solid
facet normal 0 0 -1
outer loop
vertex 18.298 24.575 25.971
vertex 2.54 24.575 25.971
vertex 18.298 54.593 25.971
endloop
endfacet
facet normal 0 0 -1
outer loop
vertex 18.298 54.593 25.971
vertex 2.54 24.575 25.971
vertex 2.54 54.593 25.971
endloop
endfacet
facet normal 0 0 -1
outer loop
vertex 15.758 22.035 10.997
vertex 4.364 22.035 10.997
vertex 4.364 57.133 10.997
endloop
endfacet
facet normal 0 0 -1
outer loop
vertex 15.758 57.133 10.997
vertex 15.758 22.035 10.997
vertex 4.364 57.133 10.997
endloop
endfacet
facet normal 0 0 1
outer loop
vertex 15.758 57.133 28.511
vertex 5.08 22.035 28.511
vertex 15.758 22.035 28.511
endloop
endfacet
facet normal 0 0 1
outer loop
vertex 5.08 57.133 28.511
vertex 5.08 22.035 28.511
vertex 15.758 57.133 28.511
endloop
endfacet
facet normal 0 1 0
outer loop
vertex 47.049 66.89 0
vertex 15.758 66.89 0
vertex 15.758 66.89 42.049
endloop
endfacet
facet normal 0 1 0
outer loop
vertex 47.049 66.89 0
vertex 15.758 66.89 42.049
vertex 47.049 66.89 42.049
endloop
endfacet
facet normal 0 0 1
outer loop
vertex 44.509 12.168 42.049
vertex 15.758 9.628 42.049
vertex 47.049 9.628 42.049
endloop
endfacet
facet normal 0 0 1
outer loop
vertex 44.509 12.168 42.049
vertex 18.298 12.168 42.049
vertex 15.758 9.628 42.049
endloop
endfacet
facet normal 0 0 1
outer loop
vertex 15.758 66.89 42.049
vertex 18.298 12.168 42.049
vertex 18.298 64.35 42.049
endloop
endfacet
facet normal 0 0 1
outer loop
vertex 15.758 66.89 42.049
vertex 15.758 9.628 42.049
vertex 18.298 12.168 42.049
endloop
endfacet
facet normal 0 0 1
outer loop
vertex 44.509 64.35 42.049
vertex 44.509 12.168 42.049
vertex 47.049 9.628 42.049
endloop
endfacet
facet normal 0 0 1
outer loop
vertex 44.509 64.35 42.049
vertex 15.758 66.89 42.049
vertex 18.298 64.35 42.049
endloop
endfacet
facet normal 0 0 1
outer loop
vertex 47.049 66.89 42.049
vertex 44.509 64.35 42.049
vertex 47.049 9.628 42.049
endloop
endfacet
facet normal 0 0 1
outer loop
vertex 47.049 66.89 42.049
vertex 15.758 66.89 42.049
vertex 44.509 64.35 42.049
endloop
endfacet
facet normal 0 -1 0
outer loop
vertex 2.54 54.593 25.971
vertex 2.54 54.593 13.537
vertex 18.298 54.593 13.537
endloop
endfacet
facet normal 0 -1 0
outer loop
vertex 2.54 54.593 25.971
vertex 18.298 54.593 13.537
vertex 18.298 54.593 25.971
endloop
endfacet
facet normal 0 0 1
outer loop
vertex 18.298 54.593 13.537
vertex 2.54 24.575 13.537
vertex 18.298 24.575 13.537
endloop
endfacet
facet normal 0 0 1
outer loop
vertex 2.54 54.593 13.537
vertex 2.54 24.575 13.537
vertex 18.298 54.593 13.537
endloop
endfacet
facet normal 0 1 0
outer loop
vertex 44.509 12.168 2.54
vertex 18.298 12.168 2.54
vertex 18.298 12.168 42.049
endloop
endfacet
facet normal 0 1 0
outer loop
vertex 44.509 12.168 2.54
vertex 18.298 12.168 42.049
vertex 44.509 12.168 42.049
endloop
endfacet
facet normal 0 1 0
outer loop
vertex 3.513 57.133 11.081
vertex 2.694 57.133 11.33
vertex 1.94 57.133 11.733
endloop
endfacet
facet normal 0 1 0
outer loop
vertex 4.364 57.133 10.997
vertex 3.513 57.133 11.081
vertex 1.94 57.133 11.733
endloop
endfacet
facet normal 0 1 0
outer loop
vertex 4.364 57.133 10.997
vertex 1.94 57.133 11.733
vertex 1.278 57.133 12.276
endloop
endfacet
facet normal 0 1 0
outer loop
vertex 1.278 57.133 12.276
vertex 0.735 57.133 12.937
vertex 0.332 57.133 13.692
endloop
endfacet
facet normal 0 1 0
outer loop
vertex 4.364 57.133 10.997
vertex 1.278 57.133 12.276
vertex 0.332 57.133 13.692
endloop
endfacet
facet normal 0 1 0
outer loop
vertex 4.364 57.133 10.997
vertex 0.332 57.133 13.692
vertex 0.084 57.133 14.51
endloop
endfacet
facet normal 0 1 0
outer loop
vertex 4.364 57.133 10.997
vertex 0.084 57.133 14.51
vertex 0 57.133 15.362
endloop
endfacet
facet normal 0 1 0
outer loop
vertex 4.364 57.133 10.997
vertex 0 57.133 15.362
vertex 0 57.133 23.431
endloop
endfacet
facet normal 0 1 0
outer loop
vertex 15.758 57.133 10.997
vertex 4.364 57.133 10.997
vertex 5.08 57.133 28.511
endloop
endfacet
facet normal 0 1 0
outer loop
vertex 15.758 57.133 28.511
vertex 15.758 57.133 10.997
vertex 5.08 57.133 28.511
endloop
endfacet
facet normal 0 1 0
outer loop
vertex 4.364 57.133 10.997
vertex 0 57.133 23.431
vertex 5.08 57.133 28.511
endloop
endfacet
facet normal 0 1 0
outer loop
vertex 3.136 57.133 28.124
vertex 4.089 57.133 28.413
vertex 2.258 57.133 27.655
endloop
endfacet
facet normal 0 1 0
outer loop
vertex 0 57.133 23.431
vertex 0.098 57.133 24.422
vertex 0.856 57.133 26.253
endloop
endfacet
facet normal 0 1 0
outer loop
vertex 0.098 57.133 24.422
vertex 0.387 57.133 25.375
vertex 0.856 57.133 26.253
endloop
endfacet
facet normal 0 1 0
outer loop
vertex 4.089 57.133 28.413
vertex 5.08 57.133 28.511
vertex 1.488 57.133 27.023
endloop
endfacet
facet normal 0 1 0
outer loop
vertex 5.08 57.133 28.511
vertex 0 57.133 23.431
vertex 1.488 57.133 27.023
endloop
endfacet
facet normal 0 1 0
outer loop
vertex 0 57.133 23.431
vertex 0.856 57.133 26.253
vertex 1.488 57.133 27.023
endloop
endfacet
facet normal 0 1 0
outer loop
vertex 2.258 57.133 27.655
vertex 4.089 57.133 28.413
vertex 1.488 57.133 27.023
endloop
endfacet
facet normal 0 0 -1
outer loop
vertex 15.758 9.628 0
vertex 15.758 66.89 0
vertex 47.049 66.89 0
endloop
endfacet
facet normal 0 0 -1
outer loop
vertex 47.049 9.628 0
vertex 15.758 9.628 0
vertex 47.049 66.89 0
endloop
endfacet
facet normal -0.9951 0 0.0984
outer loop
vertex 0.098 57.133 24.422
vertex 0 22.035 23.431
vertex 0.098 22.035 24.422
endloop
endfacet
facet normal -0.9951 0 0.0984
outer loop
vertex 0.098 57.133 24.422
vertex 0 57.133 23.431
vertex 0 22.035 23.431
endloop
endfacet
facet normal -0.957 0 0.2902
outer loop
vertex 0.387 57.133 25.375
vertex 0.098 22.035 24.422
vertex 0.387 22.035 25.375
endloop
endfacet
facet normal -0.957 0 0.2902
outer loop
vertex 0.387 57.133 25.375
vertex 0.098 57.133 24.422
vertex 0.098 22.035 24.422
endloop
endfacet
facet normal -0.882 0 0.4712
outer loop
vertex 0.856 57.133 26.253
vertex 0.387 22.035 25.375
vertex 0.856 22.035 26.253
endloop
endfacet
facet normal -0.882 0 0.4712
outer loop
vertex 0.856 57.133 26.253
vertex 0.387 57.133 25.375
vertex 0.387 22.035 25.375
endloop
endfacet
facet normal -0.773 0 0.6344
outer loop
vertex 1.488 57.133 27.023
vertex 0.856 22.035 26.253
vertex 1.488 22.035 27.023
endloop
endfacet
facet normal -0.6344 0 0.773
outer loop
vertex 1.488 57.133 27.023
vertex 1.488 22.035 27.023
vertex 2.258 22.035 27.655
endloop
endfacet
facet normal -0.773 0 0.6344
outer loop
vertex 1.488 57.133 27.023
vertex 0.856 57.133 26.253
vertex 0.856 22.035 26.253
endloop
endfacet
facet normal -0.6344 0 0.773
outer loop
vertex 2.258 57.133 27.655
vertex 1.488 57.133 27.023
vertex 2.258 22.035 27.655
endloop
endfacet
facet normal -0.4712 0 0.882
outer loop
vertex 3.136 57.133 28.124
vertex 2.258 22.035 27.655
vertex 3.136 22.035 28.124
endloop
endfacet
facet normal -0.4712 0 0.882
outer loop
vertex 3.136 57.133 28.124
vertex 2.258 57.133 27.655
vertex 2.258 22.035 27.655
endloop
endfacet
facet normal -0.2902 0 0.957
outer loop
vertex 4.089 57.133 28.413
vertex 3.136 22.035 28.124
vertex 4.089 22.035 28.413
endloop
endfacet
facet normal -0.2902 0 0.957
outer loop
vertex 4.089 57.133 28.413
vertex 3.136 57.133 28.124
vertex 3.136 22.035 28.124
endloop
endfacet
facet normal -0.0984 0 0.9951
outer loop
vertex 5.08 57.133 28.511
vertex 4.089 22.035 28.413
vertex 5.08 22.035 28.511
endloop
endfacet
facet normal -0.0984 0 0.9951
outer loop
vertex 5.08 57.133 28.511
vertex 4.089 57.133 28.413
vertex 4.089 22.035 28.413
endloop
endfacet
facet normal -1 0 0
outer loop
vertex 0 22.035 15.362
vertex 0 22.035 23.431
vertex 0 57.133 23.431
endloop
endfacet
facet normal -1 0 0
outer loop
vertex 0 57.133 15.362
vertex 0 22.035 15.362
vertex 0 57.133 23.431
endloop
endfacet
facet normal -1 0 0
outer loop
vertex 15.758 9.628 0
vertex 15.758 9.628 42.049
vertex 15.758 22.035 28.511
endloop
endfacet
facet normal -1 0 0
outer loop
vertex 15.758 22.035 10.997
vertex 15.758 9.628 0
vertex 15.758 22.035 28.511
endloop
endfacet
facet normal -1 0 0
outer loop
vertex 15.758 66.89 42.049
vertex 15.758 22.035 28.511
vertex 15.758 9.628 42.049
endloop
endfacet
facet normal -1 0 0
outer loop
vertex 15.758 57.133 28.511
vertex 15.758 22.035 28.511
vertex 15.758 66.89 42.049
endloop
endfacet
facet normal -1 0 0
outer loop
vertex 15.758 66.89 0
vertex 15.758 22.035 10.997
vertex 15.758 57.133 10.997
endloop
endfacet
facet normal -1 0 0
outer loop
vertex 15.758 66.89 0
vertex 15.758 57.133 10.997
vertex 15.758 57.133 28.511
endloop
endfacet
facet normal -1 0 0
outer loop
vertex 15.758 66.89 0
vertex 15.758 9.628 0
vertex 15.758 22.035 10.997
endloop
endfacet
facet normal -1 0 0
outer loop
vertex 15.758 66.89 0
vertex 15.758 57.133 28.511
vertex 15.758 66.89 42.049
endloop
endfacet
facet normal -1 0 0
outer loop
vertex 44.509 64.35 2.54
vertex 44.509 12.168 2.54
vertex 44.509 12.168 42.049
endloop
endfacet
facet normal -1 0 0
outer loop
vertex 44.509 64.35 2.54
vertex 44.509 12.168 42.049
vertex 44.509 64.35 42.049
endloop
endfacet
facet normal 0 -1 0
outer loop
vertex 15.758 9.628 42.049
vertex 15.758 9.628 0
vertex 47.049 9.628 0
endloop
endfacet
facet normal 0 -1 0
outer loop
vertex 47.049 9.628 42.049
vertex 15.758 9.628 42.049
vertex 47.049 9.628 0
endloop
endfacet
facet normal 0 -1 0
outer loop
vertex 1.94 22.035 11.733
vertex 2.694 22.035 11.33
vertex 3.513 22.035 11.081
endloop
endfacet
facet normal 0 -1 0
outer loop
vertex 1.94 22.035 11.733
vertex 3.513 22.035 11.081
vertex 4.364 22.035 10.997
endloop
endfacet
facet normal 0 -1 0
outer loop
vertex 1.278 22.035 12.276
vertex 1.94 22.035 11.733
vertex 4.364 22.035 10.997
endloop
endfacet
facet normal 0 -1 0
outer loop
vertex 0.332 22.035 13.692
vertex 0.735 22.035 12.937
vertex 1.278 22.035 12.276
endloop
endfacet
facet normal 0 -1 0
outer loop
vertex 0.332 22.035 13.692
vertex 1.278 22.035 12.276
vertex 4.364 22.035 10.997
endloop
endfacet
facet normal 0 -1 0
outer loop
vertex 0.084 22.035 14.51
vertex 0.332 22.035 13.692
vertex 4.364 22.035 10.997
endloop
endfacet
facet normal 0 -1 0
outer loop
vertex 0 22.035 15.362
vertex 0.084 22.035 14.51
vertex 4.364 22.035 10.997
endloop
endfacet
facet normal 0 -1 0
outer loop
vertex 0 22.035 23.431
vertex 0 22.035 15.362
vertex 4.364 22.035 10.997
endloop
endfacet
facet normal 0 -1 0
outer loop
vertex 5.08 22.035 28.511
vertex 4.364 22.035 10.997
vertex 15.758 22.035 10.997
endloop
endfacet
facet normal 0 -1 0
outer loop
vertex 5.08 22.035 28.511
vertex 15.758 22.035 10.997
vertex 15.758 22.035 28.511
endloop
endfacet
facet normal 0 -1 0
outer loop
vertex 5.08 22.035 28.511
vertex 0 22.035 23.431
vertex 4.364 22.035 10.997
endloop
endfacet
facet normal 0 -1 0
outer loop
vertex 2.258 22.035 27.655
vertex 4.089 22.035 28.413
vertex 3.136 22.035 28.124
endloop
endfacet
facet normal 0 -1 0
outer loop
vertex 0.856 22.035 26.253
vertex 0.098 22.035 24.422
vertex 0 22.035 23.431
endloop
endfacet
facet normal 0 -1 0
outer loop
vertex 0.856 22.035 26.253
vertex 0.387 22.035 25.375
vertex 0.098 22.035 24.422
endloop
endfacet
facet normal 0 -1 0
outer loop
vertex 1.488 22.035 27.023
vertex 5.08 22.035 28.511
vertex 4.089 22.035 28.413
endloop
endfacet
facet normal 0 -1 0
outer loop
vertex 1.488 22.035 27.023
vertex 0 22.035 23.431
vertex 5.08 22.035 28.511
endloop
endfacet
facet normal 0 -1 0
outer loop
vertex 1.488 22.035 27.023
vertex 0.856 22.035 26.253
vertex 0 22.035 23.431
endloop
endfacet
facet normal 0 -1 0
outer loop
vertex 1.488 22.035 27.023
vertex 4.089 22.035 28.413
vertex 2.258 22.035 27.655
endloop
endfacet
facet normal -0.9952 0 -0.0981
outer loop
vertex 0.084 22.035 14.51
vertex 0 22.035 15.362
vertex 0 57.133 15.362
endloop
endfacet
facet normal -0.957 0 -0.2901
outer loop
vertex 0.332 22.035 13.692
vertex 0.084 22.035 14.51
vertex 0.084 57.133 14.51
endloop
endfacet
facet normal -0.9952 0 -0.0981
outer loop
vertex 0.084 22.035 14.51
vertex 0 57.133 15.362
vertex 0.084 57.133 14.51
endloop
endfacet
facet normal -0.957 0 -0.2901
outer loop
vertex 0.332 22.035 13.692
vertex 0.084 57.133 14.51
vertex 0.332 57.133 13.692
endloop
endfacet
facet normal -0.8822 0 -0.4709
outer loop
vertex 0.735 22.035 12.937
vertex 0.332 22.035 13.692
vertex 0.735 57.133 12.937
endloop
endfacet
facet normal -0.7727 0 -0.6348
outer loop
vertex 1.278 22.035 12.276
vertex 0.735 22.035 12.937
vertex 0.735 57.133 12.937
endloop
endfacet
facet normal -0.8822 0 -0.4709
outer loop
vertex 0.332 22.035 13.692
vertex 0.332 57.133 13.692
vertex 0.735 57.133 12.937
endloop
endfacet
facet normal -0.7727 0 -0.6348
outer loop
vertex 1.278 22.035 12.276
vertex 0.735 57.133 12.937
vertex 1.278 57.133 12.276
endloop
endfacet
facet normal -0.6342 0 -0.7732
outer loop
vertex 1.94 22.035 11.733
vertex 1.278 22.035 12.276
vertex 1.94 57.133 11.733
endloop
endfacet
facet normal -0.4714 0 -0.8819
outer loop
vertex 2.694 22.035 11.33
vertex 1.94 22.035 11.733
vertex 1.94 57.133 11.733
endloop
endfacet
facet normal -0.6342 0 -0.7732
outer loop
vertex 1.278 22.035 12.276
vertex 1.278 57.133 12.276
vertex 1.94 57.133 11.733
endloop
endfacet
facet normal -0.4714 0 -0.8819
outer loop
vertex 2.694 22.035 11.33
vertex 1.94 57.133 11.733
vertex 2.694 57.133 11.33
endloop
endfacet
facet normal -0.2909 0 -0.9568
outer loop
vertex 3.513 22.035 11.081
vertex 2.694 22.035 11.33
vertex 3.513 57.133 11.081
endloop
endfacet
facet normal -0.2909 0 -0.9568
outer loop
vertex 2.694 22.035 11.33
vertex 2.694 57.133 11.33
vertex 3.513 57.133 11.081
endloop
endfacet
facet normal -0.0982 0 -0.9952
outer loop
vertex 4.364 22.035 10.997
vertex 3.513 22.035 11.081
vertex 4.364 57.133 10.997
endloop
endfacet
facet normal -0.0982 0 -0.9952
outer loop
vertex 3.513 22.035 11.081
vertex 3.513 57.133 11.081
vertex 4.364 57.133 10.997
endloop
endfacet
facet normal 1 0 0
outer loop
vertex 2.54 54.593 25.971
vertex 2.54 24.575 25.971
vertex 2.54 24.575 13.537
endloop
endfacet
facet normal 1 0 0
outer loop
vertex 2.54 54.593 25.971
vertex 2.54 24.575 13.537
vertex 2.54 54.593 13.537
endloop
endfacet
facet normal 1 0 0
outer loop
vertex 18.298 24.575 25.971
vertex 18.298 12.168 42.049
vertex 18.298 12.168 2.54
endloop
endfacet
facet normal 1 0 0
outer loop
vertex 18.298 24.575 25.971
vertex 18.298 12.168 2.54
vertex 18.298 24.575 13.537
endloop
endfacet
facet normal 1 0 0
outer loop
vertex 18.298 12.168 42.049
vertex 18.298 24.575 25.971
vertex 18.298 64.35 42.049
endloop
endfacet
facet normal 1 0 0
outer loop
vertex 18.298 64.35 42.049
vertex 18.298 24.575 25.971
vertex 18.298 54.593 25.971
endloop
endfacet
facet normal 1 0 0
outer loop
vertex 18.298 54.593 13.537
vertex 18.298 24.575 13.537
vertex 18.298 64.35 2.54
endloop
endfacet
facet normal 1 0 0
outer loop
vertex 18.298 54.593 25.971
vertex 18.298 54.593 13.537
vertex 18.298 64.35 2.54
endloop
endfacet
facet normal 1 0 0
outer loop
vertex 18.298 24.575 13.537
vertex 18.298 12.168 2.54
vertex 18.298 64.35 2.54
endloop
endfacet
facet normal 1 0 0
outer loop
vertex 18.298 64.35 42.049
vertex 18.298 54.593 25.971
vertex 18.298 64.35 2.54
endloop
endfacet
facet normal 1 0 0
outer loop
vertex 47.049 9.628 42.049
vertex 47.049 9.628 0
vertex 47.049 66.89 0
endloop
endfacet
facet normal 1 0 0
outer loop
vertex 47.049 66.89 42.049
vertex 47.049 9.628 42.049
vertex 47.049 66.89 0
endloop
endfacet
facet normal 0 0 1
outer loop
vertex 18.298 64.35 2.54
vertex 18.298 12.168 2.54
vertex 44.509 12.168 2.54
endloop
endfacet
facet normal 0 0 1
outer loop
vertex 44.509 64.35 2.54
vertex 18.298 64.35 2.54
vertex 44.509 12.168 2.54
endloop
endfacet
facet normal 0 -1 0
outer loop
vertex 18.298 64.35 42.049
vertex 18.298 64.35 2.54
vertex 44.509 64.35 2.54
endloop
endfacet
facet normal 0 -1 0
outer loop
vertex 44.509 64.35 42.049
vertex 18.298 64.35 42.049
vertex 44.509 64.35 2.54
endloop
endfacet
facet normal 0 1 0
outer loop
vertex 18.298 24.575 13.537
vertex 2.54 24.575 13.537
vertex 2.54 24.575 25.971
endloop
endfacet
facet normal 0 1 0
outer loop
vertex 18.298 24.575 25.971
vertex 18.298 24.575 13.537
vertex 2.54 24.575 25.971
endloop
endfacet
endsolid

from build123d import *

# Parameters (mm, degrees)
F0_W     = 31.2911756337
F0_H     = 57.261432521
F1_DEPTH = 42.049087584
F2_W     = 35.097816959
F2_H     = 17.513435334
F3_DEPTH = 25.4
F4_T     = -2.54
F5_R     = 4.3641742047
F6_R     = 5.08


with BuildPart() as f1:
    # F0 (on Top) → F1 (new body)
    with BuildSketch(Plane.XY):
        with Locations((31.4034726471, 38.2589423098)):
            Rectangle(F0_W, F0_H)
    extrude(amount=F1_DEPTH)

    # F2 (on Right) → F3 (join)
    with BuildSketch(Plane.YZ):
        with Locations((39.5839652047, 19.7541881353)):
            Rectangle(F2_W, F2_H)
    extrude(amount=F3_DEPTH)

    # F4
    f4_openings = [f1.faces().sort_by_distance(p)[0] for p in [
        (31.403473, 38.258942, 42.049088),
    ]]
    offset(amount=F4_T, openings=f4_openings, kind=Kind.INTERSECTION)

    # F5
    f5_edges = [f1.edges().sort_by_distance(p)[0] for p in [
        (0, 39.583965, 10.99747),
    ]]
    fillet(f5_edges, radius=F5_R)

    # F6
    f6_edges = [f1.edges().sort_by_distance(p)[0] for p in [
        (0, 39.583965, 28.510906),
    ]]
    fillet(f6_edges, radius=F6_R)


solid = f1.part
